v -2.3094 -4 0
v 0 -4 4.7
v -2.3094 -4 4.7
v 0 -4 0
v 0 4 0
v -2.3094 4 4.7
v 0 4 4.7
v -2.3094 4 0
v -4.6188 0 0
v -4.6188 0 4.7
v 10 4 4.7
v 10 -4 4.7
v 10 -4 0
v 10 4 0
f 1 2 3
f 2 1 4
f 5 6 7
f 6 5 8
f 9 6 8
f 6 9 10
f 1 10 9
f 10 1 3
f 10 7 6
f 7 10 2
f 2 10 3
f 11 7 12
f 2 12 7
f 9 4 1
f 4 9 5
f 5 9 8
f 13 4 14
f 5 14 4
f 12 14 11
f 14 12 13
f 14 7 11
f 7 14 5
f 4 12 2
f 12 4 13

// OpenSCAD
/*
*Author: Eduardo Foltran
*All dimensions are in mm
*Date: 2020-05-31
*Version: 1.0 - Initial design
*License: Creative Commons CC-BY (Attribution)
*Thingiverse: https://www.thingiverse.com/thing:NotPublisheYet
*Visit my portifolio at
*https://www.thingiverse.com/EduardoFoltran/designs
*Inspired on a design by Russell Cantos
*https://www.slideshare.net/RussellCantos/shopdrawing-hand-grinder
*Original PDF avaliable on Thingiverse
*/

//MType, Diametro, espessura
    Sizes=[
            [1.6,3.2,1.3], //M1.6
            [2,4.00,1.6], //M2
            [2.5,5,2], //M2.5
            [3,6,2.4], //M3
            [4,7,3.2], //M4
            [5,8,4.7], //M5
            [6,10,5.2], //M6
            [8,13,6.8], //M8
            [10,15,9.1], //M10
            [12,19,10]  //M12
            ];

function GetType(M=3,i=0) = (i == len(Sizes))?[0,0,0]:(M == Sizes[i][0])?Sizes[i]:GetType(M = M, i = i + 1);
function GetThickness(M=3) = GetType(M = M)[2];
function GetWidth(M=3) = GetType(M = M)[1];
function GetMaxWidth(M=3) = GetWidth(M = M)*2*sqrt(3)/3;

module MNut(M=3, Insert=0, Folga=0){
    i=GetType(M);    
    D=(i[1]+Folga)*2*sqrt(3)/3;
    translate([0,0,-Folga/2]){
        cylinder(d=D,h=i[2]+Folga,$fn=6);
        if (Insert!=0){
            L=i[1]+Folga;
            translate([0,-L/2,0])
                cube([Insert,L,i[2]+Folga]);
        }
    }
}

MNut(5,10,0);
